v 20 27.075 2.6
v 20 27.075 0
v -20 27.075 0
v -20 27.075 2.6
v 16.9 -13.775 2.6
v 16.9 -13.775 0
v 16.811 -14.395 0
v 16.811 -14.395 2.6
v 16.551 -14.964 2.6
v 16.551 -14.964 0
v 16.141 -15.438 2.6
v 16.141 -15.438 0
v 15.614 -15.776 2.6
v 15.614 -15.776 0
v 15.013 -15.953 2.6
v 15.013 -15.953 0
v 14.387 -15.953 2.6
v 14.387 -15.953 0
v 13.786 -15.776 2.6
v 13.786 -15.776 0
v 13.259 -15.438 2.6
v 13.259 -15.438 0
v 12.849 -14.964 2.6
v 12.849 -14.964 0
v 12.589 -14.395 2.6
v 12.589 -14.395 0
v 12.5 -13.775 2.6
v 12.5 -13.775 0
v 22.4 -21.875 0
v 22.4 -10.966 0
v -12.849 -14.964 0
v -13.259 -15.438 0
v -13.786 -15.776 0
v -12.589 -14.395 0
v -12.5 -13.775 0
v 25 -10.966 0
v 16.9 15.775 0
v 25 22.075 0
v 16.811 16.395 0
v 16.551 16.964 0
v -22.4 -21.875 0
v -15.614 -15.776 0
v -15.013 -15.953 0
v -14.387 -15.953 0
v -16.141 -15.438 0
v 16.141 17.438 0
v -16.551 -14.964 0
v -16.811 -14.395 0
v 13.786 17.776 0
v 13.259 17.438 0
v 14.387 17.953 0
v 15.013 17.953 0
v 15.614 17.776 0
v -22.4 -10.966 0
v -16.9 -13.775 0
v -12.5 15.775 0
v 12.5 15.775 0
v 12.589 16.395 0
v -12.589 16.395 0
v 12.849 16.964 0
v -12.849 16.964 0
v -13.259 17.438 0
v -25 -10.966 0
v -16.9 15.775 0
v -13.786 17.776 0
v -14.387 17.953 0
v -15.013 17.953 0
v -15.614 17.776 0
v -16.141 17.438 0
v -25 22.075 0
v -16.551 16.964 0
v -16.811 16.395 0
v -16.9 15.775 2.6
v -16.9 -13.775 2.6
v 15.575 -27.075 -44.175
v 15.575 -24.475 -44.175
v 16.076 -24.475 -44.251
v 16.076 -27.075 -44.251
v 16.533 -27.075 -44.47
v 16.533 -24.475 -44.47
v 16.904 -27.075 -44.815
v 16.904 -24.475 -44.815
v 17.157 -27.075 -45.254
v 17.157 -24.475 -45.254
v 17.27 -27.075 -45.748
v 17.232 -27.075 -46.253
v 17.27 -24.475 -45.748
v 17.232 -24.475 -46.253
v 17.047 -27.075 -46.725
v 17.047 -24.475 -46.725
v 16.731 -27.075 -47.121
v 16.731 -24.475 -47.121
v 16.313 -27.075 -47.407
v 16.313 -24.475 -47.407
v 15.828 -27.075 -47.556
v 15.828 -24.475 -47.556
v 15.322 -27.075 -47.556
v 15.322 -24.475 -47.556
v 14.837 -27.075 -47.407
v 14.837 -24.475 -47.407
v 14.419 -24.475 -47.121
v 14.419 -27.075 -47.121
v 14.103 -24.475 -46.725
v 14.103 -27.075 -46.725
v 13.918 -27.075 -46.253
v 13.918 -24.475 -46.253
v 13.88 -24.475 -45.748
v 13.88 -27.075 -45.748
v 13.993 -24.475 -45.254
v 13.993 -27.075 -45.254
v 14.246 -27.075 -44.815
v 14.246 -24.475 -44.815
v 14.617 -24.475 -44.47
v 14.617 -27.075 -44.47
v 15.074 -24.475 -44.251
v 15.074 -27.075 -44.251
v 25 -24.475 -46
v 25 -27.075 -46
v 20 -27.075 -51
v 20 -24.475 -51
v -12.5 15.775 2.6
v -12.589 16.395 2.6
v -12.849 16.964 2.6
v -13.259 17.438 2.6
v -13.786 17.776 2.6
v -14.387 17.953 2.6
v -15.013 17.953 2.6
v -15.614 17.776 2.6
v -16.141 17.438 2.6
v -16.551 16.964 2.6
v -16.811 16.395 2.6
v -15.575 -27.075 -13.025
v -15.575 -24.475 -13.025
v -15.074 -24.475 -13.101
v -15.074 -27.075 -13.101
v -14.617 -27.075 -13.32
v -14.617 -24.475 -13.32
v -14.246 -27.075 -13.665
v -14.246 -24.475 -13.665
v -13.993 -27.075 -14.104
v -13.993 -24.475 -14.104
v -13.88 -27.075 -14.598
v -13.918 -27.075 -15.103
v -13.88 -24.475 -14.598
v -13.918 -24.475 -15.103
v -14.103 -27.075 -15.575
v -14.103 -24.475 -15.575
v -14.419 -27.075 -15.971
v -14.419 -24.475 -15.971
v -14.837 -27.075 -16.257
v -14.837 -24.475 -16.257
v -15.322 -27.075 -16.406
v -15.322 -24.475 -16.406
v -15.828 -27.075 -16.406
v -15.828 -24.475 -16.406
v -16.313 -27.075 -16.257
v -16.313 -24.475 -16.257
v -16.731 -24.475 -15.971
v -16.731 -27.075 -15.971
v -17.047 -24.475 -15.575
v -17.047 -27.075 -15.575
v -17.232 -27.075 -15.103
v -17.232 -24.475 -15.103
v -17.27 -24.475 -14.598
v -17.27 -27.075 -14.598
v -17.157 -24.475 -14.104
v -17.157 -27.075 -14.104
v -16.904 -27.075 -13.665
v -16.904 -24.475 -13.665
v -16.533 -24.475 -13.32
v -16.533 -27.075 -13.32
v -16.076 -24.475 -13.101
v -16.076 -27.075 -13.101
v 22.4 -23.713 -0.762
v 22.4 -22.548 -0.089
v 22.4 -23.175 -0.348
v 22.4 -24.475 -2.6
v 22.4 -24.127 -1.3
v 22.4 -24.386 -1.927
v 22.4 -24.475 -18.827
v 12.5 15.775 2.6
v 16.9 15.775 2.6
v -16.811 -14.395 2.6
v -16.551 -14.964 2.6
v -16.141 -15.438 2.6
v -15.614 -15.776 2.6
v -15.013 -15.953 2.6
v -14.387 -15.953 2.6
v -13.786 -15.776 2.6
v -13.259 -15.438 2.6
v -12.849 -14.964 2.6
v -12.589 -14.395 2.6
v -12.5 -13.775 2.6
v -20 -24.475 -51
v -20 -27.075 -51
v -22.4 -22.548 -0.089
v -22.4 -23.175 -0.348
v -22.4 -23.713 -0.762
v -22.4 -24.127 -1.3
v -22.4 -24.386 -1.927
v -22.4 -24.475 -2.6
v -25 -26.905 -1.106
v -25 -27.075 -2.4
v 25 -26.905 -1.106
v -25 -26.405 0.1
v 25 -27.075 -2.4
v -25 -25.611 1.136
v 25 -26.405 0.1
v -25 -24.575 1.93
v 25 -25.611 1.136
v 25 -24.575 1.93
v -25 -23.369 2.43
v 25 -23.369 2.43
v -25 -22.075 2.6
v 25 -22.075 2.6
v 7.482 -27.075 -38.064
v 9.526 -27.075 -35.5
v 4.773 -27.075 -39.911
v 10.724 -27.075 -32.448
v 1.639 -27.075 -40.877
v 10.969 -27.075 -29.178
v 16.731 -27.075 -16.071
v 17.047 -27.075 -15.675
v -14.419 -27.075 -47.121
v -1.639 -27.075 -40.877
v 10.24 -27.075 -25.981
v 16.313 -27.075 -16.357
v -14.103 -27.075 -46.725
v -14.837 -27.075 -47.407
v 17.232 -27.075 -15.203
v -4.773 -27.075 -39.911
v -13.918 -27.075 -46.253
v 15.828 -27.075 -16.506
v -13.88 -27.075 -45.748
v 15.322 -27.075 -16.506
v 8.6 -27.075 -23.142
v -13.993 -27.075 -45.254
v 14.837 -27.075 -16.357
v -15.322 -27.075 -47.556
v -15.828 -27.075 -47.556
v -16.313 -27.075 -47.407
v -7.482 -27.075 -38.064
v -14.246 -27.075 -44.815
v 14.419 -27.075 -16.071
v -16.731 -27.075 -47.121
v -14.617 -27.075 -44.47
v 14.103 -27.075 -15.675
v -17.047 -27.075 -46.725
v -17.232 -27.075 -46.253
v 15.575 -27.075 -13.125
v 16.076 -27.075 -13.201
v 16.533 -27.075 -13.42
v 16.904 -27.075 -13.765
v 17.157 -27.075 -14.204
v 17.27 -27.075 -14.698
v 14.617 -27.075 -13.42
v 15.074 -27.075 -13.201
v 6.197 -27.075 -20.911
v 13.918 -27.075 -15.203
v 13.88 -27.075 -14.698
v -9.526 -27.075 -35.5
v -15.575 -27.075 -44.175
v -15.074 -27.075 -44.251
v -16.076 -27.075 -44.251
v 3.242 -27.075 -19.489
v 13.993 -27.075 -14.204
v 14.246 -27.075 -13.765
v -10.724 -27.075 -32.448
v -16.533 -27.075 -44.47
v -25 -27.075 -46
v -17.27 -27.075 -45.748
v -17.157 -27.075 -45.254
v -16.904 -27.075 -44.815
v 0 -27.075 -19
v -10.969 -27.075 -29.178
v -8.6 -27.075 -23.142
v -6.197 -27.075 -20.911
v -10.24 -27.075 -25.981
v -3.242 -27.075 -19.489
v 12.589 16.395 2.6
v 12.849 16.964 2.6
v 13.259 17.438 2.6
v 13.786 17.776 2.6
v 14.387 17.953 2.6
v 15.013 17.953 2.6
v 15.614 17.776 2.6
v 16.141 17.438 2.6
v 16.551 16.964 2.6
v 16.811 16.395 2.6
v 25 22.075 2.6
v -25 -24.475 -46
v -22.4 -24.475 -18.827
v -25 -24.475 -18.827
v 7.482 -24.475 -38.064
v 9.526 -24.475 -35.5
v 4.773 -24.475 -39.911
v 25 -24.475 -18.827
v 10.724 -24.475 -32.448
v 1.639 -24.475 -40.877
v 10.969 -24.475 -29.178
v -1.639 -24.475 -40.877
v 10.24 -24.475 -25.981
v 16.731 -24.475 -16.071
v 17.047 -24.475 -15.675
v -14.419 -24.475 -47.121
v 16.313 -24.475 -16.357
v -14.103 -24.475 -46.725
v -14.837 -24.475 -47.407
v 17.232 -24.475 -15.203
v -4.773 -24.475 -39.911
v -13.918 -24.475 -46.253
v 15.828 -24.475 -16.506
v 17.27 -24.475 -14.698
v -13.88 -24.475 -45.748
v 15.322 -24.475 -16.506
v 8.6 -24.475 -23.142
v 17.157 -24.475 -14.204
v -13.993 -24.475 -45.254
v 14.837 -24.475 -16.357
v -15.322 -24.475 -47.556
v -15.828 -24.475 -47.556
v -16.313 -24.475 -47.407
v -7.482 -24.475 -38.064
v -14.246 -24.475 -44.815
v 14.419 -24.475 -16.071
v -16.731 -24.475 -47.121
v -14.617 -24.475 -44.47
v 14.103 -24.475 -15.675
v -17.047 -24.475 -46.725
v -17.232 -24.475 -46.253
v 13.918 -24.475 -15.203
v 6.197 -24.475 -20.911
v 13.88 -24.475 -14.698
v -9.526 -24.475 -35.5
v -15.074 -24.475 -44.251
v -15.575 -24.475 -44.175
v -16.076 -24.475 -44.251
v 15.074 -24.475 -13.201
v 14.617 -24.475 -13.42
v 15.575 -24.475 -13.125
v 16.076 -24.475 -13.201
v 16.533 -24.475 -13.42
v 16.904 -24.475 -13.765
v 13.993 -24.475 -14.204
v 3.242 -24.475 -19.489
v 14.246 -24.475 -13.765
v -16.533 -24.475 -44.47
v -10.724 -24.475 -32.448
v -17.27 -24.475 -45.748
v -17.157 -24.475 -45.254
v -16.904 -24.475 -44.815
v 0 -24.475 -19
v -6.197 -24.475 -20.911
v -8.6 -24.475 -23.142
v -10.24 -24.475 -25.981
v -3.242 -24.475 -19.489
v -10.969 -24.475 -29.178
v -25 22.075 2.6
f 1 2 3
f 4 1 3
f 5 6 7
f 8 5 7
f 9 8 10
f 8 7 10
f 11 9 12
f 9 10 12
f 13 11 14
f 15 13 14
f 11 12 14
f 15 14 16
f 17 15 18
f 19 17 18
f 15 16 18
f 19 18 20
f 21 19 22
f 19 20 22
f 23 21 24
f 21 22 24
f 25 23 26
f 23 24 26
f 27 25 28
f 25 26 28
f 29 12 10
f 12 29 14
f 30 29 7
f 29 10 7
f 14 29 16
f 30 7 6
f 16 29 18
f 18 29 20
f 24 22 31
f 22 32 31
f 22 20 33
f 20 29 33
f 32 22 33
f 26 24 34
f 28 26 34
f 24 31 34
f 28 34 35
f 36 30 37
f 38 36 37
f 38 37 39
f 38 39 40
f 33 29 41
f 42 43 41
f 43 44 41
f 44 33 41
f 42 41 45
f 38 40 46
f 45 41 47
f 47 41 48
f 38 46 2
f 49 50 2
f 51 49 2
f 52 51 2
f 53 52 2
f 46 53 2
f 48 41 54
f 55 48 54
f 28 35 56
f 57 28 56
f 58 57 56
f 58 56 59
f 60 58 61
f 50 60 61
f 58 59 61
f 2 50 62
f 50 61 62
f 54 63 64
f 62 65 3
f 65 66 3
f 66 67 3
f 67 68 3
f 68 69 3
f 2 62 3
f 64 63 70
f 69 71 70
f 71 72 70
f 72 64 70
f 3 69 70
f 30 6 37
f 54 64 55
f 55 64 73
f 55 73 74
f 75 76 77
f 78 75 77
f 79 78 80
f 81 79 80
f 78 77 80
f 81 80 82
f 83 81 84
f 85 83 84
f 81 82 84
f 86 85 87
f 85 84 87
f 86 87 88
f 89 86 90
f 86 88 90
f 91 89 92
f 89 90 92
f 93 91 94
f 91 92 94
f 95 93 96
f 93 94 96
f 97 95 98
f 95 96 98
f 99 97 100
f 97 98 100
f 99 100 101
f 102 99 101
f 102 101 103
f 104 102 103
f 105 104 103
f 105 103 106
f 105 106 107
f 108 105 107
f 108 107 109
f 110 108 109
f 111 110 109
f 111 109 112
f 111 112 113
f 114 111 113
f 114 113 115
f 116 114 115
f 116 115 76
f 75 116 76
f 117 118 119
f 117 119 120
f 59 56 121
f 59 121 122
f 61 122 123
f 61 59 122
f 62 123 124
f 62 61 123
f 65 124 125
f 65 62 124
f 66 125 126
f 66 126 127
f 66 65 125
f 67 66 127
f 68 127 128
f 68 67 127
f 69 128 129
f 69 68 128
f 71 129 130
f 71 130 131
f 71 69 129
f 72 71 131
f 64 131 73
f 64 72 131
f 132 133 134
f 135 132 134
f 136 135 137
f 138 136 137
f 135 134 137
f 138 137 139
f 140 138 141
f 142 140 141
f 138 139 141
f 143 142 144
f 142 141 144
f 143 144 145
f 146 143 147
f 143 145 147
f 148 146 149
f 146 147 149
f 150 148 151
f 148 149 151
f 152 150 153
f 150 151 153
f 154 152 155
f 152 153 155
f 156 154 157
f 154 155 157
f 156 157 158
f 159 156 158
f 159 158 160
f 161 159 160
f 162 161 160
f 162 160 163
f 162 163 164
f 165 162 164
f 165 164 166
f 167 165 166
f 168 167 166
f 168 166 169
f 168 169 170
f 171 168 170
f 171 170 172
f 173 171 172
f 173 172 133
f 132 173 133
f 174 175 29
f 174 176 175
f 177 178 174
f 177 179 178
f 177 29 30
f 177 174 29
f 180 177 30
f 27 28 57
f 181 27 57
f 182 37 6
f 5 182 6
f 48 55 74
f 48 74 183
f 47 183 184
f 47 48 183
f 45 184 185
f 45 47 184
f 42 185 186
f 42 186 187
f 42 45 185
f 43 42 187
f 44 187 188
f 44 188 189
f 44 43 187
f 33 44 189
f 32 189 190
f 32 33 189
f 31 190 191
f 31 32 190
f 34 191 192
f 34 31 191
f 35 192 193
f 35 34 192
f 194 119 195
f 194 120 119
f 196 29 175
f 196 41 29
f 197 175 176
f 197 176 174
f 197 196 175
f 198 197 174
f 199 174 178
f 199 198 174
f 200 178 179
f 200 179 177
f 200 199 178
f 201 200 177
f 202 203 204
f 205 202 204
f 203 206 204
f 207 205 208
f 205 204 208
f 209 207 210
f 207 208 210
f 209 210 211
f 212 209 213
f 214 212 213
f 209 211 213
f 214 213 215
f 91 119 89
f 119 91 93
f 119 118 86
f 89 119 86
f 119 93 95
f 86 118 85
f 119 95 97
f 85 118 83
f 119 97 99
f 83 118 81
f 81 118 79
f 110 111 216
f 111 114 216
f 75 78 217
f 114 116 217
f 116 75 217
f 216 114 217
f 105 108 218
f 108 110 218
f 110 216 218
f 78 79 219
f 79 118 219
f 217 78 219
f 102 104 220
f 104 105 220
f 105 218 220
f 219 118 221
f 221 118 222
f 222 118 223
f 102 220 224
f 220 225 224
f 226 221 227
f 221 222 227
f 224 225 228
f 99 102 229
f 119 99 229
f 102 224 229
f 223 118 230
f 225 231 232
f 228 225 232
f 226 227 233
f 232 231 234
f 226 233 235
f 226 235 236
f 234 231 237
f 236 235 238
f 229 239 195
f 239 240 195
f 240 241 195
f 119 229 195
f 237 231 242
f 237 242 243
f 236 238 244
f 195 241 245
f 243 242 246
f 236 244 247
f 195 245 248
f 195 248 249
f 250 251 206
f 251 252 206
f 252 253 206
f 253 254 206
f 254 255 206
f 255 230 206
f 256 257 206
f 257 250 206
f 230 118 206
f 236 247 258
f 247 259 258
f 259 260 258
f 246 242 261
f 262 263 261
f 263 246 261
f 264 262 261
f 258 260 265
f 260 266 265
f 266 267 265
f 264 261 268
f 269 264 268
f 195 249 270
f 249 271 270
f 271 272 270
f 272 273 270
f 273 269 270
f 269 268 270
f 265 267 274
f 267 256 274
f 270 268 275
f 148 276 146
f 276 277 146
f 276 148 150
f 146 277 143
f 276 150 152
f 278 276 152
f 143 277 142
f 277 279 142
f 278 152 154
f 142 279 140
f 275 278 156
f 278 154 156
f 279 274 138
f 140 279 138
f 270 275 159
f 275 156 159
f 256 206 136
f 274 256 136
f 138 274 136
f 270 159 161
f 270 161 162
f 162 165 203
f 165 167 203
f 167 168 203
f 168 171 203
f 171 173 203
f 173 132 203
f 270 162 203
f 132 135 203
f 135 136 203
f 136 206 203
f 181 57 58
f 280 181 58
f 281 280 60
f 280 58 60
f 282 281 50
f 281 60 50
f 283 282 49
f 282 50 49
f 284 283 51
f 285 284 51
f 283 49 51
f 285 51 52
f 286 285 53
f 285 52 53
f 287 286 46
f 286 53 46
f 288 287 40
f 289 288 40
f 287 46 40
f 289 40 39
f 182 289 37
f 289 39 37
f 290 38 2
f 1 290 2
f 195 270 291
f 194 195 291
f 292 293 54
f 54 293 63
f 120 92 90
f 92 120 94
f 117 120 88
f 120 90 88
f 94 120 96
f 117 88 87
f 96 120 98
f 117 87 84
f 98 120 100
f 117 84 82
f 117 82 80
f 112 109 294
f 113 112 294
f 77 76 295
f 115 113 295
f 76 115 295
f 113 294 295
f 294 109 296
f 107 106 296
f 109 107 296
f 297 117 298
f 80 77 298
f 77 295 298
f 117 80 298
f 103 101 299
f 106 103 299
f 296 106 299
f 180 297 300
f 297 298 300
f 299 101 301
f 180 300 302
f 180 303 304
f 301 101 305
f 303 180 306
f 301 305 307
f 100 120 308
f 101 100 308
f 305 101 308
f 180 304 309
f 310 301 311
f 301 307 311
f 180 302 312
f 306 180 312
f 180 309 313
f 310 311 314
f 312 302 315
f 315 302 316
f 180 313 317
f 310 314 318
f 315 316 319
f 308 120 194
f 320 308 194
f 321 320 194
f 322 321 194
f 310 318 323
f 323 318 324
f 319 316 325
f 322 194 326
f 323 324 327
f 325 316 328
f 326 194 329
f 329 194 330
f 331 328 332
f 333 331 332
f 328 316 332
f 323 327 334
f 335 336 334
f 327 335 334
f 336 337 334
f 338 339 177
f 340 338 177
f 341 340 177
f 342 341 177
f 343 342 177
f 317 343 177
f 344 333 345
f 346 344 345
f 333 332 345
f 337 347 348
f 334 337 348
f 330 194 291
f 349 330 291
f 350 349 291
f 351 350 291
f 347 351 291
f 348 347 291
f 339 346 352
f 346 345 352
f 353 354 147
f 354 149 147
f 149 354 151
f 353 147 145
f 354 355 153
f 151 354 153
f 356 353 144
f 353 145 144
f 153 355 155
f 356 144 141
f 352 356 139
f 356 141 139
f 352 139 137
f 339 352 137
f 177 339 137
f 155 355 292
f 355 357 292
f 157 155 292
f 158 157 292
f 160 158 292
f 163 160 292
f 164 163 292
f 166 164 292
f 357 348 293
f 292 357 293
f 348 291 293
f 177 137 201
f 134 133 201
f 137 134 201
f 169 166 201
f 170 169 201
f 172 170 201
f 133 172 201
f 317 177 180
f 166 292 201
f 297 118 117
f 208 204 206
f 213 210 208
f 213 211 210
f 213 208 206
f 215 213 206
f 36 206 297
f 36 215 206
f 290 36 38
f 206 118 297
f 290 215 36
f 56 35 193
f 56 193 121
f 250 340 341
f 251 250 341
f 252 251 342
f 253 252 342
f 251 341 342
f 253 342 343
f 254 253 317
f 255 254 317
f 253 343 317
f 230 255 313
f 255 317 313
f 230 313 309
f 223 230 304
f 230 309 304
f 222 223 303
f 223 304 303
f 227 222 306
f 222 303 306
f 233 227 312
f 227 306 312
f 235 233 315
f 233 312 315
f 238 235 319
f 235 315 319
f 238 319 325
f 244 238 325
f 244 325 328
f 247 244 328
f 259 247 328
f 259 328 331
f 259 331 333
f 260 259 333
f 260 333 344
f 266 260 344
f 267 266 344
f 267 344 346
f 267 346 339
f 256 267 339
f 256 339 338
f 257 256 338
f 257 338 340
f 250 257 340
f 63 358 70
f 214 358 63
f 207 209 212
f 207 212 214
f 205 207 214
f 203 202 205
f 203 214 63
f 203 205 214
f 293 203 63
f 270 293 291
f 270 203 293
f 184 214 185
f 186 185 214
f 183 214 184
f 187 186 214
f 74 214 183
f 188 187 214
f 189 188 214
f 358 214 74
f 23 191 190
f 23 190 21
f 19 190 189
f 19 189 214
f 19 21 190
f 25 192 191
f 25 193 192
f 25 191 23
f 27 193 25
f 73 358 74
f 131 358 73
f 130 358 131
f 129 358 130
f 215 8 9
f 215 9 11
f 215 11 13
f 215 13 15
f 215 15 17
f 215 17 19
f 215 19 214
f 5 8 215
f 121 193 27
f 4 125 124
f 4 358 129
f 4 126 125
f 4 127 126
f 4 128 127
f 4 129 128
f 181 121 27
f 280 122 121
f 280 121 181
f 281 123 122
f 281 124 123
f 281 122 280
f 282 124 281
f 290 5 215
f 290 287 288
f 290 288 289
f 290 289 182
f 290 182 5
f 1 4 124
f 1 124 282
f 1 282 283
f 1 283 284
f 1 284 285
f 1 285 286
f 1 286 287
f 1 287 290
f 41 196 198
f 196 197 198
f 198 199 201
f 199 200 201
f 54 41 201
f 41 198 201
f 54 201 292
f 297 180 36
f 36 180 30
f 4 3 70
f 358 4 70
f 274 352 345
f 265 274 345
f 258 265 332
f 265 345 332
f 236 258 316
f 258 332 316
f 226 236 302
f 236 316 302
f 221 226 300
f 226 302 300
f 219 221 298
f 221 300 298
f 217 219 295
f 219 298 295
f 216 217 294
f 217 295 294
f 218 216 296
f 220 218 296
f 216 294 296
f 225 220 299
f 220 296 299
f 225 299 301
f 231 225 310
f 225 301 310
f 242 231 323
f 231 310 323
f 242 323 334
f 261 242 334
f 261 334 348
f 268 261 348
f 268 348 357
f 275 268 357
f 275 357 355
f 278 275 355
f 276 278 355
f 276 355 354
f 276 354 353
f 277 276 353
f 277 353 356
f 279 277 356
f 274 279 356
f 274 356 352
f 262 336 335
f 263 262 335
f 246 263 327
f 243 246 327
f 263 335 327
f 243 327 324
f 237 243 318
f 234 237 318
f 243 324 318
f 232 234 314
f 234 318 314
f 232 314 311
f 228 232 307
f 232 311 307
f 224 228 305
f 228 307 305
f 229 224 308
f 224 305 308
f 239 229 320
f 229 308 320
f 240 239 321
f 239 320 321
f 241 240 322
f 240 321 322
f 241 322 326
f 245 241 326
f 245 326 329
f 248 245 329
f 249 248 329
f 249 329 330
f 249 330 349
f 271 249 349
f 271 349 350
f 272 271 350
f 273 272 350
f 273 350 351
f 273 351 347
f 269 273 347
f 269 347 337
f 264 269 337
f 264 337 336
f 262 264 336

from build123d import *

# Parameters (mm, degrees)
SALIENTE_EXTRUIR1_DEPTH = 2.6
CROQUIS5_W              = 50
CROQUIS5_H              = 2.6
SALIENTE_EXTRUIR2_DEPTH = 51
REDONDEO1_R             = 5
CROQUIS7_R              = 11
CROQUIS7_R_2            = 1.7
CORTAR_EXTRUIR1_DEPTH   = 77.703340866
CHAFL_N1_SIZE           = 5
CROQUIS8_W              = 2.6
CROQUIS8_H              = 20
SALIENTE_EXTRUIR3_DEPTH = 14.5
CORTAR_EXTRUIR2_DEPTH   = 77.380989945
REDONDEO2_R             = 2.6


with BuildPart() as part:
    # Croquis3 → Saliente-Extruir1 (new body)
    with BuildSketch(Plane.XY):
        Polygon((-25, -27.075), (25, -27.075), (25, 22.075), (20, 27.075), (-20, 27.075), (-25, 22.075), align=None)
        with BuildLine():
            Line((16.9, 15.775), (16.9, -13.775))
            ThreePointArc((16.9, -13.775), (14.7, -15.975), (12.5, -13.775))
            Line((12.5, -13.775), (12.5, 15.775))
            ThreePointArc((12.5, 15.775), (14.7, 17.975), (16.9, 15.775))
        make_face(mode=Mode.SUBTRACT)
        with BuildLine():
            Line((-16.9, 15.775), (-16.9, -13.775))
            ThreePointArc((-16.9, -13.775), (-14.7, -15.975), (-12.5, -13.775))
            Line((-12.5, -13.775), (-12.5, 15.775))
            ThreePointArc((-12.5, 15.775), (-14.7, 17.975), (-16.9, 15.775))
        make_face(mode=Mode.SUBTRACT)
    extrude(amount=SALIENTE_EXTRUIR1_DEPTH)

    # Croquis5 → Saliente-Extruir2 (add)
    with BuildSketch(Plane(origin=(0, 0, 0), x_dir=(-1, 0, 0), z_dir=(0, 0, -1))):
        with Locations((0, -25.775)):
            Rectangle(CROQUIS5_W, CROQUIS5_H)
    extrude(amount=SALIENTE_EXTRUIR2_DEPTH)

    # Redondeo1
    redondeo1_edges = [part.edges().sort_by_distance(p)[0] for p in [
        (0, -27.075, 2.6),
    ]]
    fillet(redondeo1_edges, radius=REDONDEO1_R)

    # Croquis7 → Cortar-Extruir1 (cut, through all)
    with BuildSketch(Plane(origin=(0, -24.475, 0), x_dir=(1, 0, 0), z_dir=(0, 1, 0))):
        with Locations(Location((0, 30, 0), (0, 0, 270))):
            Circle(CROQUIS7_R)
        with Locations(Location((-15.575, 45.875, 0), (0, 0, 270))):
            Circle(CROQUIS7_R_2)
        with Locations(Location((15.575, 45.875, 0), (0, 0, 270))):
            Circle(CROQUIS7_R_2)
        with Locations(Location((15.575, 14.825, 0), (0, 0, 270))):
            Circle(CROQUIS7_R_2)
        with Locations(Location((-15.575, 14.725, 0), (0, 0, 270))):
            Circle(CROQUIS7_R_2)
    extrude(amount=-CORTAR_EXTRUIR1_DEPTH, mode=Mode.SUBTRACT)

    # Chaflán1
    chafl_n1_edges = [part.edges().sort_by_distance(p)[0] for p in [
        (25, -25.775, -51),
        (-25, -25.775, -51),
    ]]
    chamfer(chafl_n1_edges, length=CHAFL_N1_SIZE)

    # Croquis8 → Saliente-Extruir3 (add)
    with BuildSketch(Plane(origin=(0, -24.475, 0), x_dir=(1, 0, 0), z_dir=(0, 1, 0))):
        with Locations((-23.7, 10)):
            Rectangle(CROQUIS8_W, CROQUIS8_H)
        with Locations((23.7, 10)):
            Rectangle(CROQUIS8_W, CROQUIS8_H)
    extrude(amount=SALIENTE_EXTRUIR3_DEPTH)

    # Croquis9 → Cortar-Extruir2 (cut, through all)
    with BuildSketch(Plane.ZY.offset(25)):
        Polygon((-20, -24.475), (-18.827189976, -24.475), (0, -10.965826599), (0, -9.975), (-20, -9.975), align=None)
    extrude(amount=-CORTAR_EXTRUIR2_DEPTH, mode=Mode.SUBTRACT)

    # Redondeo2
    redondeo2_edges = [part.edges().sort_by_distance(p)[0] for p in [
        (0, -24.475, 0),
    ]]
    fillet(redondeo2_edges, radius=REDONDEO2_R)


solid = part.part
